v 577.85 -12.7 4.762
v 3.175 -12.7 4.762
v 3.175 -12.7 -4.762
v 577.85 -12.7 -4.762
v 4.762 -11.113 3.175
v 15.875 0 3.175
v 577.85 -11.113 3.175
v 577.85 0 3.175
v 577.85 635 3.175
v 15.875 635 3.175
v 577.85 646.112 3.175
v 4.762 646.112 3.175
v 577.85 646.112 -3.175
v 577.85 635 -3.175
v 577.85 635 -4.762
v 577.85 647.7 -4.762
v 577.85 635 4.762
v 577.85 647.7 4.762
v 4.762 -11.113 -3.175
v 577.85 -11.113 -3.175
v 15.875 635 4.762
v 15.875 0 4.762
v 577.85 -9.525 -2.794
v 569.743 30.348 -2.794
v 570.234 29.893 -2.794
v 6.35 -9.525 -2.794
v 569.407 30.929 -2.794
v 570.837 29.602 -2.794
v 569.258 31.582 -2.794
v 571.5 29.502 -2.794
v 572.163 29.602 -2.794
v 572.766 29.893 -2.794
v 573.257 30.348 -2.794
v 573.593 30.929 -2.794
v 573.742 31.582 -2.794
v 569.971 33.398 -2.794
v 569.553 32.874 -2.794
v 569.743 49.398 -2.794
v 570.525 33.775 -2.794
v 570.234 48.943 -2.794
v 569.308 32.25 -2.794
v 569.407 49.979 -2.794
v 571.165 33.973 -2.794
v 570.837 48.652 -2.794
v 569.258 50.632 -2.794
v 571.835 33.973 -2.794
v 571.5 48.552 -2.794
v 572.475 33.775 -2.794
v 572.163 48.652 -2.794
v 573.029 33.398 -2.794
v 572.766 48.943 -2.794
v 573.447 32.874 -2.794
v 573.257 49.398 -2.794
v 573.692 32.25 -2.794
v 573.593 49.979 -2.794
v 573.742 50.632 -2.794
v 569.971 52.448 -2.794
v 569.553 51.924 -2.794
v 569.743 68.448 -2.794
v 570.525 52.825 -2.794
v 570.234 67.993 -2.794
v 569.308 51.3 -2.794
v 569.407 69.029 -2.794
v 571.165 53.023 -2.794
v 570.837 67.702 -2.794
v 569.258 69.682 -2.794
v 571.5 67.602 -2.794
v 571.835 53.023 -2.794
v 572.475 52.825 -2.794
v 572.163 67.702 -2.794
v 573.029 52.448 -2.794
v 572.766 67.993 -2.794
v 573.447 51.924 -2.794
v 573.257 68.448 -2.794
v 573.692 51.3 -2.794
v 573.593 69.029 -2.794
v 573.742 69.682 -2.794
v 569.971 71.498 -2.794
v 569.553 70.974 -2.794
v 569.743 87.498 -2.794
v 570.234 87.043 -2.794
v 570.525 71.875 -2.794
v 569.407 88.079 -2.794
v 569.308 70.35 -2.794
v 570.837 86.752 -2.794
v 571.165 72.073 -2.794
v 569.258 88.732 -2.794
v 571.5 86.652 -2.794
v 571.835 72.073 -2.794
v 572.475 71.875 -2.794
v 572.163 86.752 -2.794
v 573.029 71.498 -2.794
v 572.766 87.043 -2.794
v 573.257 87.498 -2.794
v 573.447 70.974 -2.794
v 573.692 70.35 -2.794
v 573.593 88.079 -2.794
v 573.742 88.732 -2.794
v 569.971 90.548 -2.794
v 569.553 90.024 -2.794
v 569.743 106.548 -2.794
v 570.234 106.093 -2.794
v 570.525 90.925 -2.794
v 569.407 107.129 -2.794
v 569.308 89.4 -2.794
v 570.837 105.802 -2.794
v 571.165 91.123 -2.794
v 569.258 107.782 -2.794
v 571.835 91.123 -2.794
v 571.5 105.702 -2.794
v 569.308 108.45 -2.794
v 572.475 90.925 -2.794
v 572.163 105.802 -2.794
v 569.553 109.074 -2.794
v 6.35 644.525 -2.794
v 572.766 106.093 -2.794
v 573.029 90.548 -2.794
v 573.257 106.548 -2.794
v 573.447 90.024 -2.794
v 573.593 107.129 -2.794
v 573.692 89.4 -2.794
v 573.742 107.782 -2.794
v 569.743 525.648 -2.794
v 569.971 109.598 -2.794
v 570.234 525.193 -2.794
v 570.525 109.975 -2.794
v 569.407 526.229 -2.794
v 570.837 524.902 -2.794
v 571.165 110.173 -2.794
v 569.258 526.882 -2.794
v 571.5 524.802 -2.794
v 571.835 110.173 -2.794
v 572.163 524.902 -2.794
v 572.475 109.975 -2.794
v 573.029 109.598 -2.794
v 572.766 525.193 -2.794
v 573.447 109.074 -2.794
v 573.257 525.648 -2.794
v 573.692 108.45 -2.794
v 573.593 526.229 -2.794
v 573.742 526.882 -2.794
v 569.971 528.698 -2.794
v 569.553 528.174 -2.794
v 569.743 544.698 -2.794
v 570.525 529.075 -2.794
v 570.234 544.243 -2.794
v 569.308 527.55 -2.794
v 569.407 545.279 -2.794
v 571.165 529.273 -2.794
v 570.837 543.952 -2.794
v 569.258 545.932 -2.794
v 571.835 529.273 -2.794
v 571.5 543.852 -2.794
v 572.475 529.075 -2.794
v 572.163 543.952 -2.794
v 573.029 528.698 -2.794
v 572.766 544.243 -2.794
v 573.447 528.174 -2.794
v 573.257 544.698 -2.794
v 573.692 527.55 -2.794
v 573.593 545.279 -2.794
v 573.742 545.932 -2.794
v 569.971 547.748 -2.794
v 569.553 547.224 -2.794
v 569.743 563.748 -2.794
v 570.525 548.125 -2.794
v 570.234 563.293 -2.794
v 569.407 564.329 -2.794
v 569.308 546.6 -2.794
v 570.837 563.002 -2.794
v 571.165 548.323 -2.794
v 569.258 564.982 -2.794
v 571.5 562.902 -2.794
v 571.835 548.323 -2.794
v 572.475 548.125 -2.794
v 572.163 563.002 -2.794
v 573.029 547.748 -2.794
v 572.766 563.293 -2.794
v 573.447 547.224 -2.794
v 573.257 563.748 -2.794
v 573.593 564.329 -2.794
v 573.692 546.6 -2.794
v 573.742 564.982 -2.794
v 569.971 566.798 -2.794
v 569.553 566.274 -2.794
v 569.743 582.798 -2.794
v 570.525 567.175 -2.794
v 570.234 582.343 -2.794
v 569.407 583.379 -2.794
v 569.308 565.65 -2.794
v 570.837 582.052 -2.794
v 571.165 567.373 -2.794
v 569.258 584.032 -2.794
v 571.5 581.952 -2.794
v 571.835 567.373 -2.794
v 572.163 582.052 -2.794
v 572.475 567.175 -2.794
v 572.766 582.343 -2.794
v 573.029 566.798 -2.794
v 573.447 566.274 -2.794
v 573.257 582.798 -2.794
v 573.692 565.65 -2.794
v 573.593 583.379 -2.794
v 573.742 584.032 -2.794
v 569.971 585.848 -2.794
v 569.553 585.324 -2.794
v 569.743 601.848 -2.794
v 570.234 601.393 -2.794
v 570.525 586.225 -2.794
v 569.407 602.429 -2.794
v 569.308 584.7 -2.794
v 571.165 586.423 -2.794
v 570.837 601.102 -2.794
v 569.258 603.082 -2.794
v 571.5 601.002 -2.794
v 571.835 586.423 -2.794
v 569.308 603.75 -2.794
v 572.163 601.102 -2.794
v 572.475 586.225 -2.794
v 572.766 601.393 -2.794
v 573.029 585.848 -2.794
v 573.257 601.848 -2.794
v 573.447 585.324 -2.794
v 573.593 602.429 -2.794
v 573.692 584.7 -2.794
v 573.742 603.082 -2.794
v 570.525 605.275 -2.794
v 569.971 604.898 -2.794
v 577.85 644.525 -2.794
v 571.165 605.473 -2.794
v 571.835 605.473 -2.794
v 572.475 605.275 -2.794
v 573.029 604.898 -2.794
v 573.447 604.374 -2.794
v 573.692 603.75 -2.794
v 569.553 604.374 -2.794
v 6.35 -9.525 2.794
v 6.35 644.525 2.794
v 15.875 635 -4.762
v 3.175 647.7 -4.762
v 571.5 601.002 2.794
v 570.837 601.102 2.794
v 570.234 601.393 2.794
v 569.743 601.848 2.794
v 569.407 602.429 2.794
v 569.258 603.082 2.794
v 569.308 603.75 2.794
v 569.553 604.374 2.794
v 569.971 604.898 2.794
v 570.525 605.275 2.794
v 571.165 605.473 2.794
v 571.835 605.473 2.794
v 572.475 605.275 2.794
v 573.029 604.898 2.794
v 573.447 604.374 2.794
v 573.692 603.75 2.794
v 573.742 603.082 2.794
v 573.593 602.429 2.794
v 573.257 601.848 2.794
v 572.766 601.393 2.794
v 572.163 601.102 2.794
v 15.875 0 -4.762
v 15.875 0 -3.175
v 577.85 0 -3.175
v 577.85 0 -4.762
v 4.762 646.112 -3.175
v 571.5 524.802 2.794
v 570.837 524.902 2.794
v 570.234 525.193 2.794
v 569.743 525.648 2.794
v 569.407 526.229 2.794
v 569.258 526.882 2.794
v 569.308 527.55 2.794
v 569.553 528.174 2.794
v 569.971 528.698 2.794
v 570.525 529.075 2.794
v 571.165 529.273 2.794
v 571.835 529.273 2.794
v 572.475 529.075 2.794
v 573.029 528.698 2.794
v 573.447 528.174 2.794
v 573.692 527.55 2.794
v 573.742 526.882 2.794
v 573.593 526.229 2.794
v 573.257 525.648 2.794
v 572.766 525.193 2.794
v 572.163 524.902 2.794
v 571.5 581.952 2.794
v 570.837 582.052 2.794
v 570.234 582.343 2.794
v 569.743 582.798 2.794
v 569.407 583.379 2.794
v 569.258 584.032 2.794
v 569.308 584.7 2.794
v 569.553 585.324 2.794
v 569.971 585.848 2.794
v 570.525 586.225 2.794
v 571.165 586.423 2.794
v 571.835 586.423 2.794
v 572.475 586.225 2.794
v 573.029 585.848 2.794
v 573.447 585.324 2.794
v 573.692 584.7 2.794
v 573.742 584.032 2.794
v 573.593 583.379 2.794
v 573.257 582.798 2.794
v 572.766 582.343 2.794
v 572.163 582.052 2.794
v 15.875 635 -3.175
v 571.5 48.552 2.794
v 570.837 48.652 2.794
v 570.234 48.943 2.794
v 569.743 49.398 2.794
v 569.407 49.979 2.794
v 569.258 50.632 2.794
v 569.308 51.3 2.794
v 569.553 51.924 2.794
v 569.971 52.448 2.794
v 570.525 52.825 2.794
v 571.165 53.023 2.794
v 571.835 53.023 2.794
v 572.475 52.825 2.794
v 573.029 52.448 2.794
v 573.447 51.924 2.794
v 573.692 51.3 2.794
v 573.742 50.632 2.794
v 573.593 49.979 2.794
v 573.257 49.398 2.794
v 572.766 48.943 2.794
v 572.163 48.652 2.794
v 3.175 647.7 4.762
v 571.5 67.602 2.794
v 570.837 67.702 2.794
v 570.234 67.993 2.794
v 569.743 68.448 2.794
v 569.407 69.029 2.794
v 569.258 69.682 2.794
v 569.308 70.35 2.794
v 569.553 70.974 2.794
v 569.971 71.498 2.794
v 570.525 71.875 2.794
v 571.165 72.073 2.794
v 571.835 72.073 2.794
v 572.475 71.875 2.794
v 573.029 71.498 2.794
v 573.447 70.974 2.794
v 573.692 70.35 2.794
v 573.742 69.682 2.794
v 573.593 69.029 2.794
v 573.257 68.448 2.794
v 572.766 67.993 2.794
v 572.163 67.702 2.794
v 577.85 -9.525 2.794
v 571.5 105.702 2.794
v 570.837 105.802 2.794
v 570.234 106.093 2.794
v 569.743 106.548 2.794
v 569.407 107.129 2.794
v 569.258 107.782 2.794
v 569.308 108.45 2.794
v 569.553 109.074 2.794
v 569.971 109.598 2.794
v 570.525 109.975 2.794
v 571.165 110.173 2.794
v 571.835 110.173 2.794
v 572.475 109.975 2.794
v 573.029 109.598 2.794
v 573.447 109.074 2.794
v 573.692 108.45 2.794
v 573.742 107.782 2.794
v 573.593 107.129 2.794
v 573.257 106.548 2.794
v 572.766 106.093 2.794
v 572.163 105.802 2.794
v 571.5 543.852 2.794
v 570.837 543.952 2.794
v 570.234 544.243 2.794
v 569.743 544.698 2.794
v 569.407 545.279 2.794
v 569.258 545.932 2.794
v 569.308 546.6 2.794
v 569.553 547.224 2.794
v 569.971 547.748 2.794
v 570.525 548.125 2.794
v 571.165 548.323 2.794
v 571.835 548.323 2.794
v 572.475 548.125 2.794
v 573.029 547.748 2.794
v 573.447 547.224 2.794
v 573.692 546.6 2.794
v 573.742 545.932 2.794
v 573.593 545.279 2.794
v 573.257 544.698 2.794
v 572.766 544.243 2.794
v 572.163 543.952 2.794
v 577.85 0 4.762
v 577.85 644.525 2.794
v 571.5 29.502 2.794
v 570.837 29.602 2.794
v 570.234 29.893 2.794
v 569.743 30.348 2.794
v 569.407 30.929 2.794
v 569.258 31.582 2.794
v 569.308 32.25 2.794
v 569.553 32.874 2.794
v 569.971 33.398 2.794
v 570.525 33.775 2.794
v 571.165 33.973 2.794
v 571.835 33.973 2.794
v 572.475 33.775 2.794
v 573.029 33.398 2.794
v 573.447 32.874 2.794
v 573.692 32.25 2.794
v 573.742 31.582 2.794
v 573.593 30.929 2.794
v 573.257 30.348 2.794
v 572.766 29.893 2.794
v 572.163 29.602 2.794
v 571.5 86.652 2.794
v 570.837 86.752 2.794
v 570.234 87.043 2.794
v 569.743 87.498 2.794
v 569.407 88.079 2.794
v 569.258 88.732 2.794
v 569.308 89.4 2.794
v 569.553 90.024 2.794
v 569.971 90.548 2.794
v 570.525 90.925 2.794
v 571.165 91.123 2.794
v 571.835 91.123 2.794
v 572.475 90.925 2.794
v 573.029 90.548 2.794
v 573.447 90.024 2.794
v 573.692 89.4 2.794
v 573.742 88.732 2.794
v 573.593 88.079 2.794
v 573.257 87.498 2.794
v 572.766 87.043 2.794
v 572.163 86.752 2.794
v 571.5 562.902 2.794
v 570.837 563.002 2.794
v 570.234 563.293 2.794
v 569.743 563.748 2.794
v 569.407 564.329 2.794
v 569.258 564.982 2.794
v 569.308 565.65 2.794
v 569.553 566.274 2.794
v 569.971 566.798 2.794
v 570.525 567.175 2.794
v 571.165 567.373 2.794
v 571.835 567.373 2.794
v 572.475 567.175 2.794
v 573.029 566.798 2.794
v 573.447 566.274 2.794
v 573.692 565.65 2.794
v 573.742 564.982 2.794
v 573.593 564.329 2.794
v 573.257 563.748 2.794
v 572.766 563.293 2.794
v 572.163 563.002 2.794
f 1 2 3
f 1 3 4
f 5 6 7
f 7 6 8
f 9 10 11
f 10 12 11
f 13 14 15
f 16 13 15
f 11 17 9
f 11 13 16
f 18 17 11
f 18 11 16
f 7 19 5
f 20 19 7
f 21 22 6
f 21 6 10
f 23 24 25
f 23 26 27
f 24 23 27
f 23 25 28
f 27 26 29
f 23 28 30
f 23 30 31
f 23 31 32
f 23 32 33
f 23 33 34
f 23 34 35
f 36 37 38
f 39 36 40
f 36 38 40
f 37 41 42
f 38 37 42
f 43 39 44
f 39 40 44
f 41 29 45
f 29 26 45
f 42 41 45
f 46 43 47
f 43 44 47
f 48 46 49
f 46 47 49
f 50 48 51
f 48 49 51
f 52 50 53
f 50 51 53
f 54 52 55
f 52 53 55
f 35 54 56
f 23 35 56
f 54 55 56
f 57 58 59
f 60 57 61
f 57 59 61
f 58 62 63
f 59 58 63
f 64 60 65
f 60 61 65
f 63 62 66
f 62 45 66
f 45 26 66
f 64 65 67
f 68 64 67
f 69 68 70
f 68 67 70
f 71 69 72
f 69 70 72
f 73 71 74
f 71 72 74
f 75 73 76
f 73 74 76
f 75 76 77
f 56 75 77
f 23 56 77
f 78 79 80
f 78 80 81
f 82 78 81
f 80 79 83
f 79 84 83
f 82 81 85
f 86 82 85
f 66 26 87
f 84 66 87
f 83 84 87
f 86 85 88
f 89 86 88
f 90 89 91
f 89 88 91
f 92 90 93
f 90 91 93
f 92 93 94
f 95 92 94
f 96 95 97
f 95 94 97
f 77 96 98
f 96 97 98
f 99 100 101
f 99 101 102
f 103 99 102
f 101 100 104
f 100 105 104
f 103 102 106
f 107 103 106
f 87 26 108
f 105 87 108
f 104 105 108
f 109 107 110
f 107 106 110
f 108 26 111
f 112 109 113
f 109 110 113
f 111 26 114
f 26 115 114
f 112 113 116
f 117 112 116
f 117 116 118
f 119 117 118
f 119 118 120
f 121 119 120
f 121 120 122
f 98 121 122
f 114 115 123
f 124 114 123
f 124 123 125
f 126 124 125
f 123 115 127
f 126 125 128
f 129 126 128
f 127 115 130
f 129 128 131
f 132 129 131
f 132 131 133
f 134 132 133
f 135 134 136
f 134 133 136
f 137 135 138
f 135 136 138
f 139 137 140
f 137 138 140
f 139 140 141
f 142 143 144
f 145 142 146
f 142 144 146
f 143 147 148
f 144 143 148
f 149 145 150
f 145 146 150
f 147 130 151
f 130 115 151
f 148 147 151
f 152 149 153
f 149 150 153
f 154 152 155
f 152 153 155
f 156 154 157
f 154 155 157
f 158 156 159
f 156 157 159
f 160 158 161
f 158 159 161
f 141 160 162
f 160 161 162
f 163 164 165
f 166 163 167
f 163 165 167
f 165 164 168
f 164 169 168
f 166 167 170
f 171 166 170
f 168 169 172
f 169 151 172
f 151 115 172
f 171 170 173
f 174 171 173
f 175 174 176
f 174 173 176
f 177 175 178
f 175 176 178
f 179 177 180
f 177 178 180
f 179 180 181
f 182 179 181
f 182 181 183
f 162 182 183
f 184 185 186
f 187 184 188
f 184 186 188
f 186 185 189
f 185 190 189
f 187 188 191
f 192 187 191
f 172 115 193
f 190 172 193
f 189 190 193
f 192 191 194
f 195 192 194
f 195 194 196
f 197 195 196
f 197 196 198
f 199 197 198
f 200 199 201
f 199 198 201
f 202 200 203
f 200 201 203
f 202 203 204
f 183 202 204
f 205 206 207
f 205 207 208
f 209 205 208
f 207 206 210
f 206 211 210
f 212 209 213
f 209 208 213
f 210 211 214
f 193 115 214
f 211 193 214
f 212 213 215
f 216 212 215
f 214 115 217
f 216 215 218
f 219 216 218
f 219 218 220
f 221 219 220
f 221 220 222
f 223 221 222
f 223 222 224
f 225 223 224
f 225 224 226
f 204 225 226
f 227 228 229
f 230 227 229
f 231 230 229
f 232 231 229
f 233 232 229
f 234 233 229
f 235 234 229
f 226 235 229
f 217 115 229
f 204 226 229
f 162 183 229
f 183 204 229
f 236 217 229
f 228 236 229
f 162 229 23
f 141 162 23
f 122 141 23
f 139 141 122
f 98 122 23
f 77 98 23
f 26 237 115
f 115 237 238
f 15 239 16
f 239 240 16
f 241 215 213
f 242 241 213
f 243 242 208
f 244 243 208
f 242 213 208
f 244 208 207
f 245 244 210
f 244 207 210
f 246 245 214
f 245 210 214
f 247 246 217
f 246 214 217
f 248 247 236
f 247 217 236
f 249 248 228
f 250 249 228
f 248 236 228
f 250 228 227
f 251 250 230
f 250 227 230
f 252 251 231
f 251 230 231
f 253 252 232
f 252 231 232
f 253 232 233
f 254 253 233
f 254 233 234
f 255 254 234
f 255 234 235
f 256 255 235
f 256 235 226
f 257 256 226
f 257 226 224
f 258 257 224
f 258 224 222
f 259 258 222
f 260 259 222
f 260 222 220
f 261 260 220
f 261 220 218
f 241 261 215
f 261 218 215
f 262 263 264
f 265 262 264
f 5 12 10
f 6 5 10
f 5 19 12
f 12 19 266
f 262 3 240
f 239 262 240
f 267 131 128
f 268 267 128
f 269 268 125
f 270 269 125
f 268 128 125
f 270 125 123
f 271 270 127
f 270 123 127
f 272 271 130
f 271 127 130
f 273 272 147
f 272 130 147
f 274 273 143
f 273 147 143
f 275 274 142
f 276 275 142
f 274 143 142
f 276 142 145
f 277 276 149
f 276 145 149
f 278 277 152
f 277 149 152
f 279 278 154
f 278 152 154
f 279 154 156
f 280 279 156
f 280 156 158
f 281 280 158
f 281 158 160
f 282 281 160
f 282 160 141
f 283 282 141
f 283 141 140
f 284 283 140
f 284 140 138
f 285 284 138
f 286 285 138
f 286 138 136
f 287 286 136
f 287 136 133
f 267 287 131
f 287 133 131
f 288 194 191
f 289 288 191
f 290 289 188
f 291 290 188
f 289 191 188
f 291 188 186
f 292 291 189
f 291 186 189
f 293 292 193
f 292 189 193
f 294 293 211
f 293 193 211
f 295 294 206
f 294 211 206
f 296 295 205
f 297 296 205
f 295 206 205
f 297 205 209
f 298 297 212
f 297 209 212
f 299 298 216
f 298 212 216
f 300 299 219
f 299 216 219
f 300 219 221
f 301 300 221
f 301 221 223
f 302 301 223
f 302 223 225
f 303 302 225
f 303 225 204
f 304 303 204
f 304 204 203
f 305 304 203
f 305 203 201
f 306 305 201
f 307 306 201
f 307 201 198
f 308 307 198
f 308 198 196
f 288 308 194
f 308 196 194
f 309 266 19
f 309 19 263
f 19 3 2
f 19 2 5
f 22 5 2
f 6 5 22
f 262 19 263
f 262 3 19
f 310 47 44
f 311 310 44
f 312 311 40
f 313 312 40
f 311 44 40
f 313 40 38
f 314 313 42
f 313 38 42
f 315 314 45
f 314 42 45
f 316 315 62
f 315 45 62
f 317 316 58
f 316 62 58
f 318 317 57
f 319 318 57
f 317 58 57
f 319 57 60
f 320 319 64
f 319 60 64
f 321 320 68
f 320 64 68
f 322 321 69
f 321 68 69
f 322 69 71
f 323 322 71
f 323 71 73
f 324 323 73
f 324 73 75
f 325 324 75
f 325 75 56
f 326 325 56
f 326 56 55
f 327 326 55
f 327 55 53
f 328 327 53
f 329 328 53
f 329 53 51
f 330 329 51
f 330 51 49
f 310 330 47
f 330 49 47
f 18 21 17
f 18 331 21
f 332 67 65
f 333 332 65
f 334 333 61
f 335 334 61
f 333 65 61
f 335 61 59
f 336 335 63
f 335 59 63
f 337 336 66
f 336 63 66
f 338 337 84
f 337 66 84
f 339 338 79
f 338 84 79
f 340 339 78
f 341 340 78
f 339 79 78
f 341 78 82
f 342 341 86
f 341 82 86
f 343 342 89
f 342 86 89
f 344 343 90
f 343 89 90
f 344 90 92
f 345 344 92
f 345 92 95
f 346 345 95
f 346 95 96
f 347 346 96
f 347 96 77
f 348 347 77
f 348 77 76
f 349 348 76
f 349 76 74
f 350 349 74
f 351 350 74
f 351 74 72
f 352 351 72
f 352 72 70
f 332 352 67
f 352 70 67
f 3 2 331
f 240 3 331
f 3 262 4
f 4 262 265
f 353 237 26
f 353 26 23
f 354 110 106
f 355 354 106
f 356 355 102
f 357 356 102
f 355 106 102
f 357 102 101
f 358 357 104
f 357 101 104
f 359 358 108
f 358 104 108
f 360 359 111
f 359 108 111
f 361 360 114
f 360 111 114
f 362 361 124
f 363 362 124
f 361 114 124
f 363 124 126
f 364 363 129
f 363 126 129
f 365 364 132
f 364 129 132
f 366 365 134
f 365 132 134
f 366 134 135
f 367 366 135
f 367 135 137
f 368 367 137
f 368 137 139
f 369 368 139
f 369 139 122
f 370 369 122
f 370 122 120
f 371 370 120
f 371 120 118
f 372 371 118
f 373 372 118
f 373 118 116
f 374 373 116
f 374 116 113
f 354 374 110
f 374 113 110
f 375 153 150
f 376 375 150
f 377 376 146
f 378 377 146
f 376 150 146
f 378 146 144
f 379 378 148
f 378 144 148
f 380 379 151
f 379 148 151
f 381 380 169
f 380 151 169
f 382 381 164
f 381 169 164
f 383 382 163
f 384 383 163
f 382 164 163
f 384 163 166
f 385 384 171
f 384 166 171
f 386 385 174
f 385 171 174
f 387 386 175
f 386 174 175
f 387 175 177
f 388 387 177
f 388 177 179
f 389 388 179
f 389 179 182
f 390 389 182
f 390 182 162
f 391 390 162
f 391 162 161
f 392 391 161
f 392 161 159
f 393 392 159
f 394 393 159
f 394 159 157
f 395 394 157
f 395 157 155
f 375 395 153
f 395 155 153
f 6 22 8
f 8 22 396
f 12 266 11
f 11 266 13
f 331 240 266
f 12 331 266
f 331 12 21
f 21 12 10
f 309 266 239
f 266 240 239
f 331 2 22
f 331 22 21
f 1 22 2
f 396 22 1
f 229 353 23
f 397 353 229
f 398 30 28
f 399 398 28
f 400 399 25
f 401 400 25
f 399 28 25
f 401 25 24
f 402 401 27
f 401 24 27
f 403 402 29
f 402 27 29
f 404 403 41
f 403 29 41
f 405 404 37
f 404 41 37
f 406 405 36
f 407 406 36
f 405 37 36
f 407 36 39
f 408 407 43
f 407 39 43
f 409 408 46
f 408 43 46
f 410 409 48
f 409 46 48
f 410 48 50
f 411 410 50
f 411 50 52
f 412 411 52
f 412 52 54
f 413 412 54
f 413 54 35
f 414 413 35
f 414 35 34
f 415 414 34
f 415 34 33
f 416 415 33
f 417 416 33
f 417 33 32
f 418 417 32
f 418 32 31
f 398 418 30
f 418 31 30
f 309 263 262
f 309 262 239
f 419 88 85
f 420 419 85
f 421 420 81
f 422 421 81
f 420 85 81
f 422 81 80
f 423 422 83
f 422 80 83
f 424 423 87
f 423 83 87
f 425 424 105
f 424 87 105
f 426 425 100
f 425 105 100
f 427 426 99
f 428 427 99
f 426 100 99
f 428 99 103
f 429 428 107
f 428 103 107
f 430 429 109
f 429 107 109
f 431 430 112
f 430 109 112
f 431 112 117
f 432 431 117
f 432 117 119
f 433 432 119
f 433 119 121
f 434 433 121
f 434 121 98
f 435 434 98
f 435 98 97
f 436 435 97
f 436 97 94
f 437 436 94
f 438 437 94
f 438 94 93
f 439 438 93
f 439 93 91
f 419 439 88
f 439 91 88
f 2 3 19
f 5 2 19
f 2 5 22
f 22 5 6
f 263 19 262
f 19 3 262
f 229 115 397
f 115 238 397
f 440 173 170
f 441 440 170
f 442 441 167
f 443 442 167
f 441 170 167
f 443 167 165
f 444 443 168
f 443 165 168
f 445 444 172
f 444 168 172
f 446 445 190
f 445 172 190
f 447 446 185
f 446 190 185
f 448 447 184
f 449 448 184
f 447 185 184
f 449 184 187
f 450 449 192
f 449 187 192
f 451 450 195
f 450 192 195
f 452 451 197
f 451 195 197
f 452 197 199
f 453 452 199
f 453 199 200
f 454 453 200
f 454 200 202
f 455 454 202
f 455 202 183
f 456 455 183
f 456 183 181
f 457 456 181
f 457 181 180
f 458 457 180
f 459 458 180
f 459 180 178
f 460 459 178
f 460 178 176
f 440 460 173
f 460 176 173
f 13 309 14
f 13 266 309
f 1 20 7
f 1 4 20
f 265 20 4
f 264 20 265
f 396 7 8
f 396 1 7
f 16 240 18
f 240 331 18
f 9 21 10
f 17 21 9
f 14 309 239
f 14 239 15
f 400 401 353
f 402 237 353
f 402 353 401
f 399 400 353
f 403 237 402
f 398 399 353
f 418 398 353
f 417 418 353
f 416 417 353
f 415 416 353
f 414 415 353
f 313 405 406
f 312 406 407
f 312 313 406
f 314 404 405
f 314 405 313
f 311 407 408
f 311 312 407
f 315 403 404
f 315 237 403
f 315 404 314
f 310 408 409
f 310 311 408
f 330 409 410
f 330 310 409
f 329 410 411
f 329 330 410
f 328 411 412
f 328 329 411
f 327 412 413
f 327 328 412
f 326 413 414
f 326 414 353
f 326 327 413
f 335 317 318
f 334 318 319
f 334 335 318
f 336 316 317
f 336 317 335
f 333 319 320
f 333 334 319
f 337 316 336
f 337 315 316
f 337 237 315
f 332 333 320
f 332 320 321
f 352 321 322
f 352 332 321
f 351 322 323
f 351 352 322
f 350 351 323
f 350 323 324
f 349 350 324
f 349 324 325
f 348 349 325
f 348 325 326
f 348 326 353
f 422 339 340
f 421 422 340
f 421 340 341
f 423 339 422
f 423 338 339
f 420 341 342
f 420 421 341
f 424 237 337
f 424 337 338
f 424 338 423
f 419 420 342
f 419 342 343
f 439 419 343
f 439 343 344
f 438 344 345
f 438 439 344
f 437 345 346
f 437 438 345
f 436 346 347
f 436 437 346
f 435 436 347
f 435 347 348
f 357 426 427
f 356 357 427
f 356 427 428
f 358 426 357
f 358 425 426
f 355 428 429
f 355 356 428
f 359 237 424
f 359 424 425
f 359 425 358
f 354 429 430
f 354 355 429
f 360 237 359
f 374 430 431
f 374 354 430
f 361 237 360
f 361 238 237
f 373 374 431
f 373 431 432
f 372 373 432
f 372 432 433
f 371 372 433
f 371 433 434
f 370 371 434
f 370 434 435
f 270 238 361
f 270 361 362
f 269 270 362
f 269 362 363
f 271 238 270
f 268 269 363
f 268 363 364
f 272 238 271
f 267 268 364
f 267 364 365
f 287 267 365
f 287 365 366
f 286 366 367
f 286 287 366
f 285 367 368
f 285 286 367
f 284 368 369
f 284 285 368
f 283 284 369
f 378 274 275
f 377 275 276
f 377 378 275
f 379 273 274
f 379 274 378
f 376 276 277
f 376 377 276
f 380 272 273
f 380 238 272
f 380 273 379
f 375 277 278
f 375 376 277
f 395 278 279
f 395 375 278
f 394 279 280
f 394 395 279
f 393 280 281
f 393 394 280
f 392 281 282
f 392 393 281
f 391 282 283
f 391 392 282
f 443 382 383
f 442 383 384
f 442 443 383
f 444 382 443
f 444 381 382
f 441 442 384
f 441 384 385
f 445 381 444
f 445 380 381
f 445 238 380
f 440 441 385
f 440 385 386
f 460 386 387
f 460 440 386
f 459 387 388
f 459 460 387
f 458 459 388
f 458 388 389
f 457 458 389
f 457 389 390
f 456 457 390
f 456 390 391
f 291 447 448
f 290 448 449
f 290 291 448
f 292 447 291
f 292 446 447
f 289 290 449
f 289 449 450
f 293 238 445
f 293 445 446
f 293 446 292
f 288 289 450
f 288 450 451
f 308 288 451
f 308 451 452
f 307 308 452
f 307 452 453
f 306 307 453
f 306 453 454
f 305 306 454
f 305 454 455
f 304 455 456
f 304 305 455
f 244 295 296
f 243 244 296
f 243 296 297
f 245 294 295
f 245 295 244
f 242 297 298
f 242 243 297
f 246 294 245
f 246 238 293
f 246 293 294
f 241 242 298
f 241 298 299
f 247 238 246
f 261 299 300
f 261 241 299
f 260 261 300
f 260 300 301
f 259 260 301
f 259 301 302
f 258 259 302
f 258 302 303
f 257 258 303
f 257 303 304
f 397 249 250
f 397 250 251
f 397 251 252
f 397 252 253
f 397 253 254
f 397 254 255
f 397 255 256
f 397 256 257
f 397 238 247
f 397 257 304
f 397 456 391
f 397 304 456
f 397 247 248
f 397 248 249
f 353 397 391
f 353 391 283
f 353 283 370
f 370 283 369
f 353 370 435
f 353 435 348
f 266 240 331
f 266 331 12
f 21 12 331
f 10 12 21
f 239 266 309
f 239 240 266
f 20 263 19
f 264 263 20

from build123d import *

# Parameters (mm, degrees)
SKETCH2_W                             = 574.675
SKETCH2_H                             = 660.4
FRAME_OUTER_DIMENSIONS_DEPTH          = 4.7625
SKETCH3_W                             = 561.975
SKETCH3_H                             = 635
FRAME_INNER_DIMENSIONS_DEPTH          = 869.053361335
FRAME_PROFILE_DEPTH                   = 3.175
FRAME_PROFILE_DEPTH_BACK              = 3.175
SKETCH4_W                             = 573.0875
SKETCH4_H                             = 657.225
FRAME_SECTION_SPLIT_SURFACE_1_1_BACK  = 876.483
FRAME_SECTION_SPLIT_SURFACE_1_1_DEPTH = 1752.966
FRAME_SECTION_SPLIT_SURFACE_1_2_BACK  = 876.483
FRAME_SECTION_SPLIT_SURFACE_1_2_DEPTH = 1752.966
FRAME_SECTION_SPLIT_SURFACE_2_3_BACK  = 876.483
FRAME_SECTION_SPLIT_SURFACE_2_3_DEPTH = 1752.966
FRAME_SECTION_SPLIT_SURFACE_2_4_BACK  = 876.483
FRAME_SECTION_SPLIT_SURFACE_2_4_DEPTH = 1752.966
SKETCH5_W                             = 571.5
SKETCH5_H                             = 654.05
DOOR_PANEL_DEPTH                      = 2.794
SKETCH9_W                             = 2.2479
SKETCH9_H                             = 7.5565
F_8_CLEARANCE_HOLE1_AT_2_COUNT        = 2
F_8_CLEARANCE_HOLE1_AT_2_PITCH        = 19.05
F_8_CLEARANCE_HOLE1_AT_3_COUNT        = 2
F_8_CLEARANCE_HOLE1_AT_3_PITCH        = 38.1
F_8_CLEARANCE_HOLE1_AT_4_COUNT        = 2
F_8_CLEARANCE_HOLE1_AT_4_PITCH        = 57.15
F_8_CLEARANCE_HOLE1_AT_5_COUNT        = 2
F_8_CLEARANCE_HOLE1_AT_5_PITCH        = 76.2
F_8_CLEARANCE_HOLE1_AT_6_COUNT        = 2
F_8_CLEARANCE_HOLE1_AT_6_PITCH        = 514.35
F_8_CLEARANCE_HOLE1_AT_7_COUNT        = 2
F_8_CLEARANCE_HOLE1_AT_7_PITCH        = 533.4
F_8_CLEARANCE_HOLE1_AT_8_COUNT        = 2
F_8_CLEARANCE_HOLE1_AT_8_PITCH        = 552.45
F_8_CLEARANCE_HOLE1_AT_9_COUNT        = 2
F_8_CLEARANCE_HOLE1_AT_9_PITCH        = 571.5
F_8_CLEARANCE_HOLE1_AT_10_COUNT       = 2
F_8_CLEARANCE_HOLE1_AT_10_PITCH       = 495.3


with BuildPart() as part:
    # Sketch2 → Frame outer dimensions (new, symmetric)
    with BuildSketch(Plane.XY):
        with Locations((290.5125, 317.5)):
            Rectangle(SKETCH2_W, SKETCH2_H)
    extrude(amount=FRAME_OUTER_DIMENSIONS_DEPTH, both=True)

    # Sketch3 → Frame inner dimensions (cut, through all)
    with BuildSketch(Plane.XY.offset(4.7625)):
        with Locations((296.8625, 317.5)):
            Rectangle(SKETCH3_W, SKETCH3_H)
    extrude(amount=-FRAME_INNER_DIMENSIONS_DEPTH, mode=Mode.SUBTRACT)

    # Sketch4 → Frame profile (cut, two sides: drawn at the far end of the back side and taken through both)
    with BuildSketch(Plane.XY.offset(-FRAME_PROFILE_DEPTH_BACK)):
        with Locations((291.30625, 317.5)):
            Rectangle(SKETCH4_W, SKETCH4_H)
    extrude(amount=FRAME_PROFILE_DEPTH + FRAME_PROFILE_DEPTH_BACK, mode=Mode.SUBTRACT)


with BuildPart() as body_2:
    # Frame section split: the piece behind the surface
    add(part.part)
    # Frame section split surface 1: a surface, the sketch's curves swept straight by 1752.966 mm
    with BuildLine(Plane.XY.offset(4.7625).offset(-FRAME_SECTION_SPLIT_SURFACE_1_1_BACK), mode=Mode.PRIVATE) as frame_section_split_surface_1_1_path:
        Line((3.175, 647.7), (15.875, 635))
    frame_section_split_surface_1_1 = Shell.extrude(frame_section_split_surface_1_1_path.wire(), (0 * FRAME_SECTION_SPLIT_SURFACE_1_1_DEPTH, 0 * FRAME_SECTION_SPLIT_SURFACE_1_1_DEPTH, 1 * FRAME_SECTION_SPLIT_SURFACE_1_1_DEPTH))
    split(bisect_by=frame_section_split_surface_1_1, keep=Keep.BOTTOM)


with BuildPart() as part_1:
    add(part.part)

    # Frame section split: split by a surface, the side it looks to stays
    # Frame section split surface 1: a surface, the sketch's curves swept straight by 1752.966 mm
    with BuildLine(Plane.XY.offset(4.7625).offset(-FRAME_SECTION_SPLIT_SURFACE_1_2_BACK), mode=Mode.PRIVATE) as frame_section_split_surface_1_2_path:
        Line((3.175, 647.7), (15.875, 635))
    frame_section_split_surface_1_2 = Shell.extrude(frame_section_split_surface_1_2_path.wire(), (0 * FRAME_SECTION_SPLIT_SURFACE_1_2_DEPTH, 0 * FRAME_SECTION_SPLIT_SURFACE_1_2_DEPTH, 1 * FRAME_SECTION_SPLIT_SURFACE_1_2_DEPTH))
    split(bisect_by=frame_section_split_surface_1_2, keep=Keep.TOP)


with BuildPart() as body_3:
    # Frame section split 2 body 2: the piece behind the surface
    add(body_2.part)
    # Frame section split surface 2: a surface, the sketch's curves swept straight by 1752.966 mm
    with BuildLine(Plane.XY.offset(4.7625).offset(-FRAME_SECTION_SPLIT_SURFACE_2_3_BACK), mode=Mode.PRIVATE) as frame_section_split_surface_2_3_path:
        Line((3.175, -12.7), (15.875, 0))
    frame_section_split_surface_2_3 = Shell.extrude(frame_section_split_surface_2_3_path.wire(), (0 * FRAME_SECTION_SPLIT_SURFACE_2_3_DEPTH, 0 * FRAME_SECTION_SPLIT_SURFACE_2_3_DEPTH, 1 * FRAME_SECTION_SPLIT_SURFACE_2_3_DEPTH))
    split(bisect_by=frame_section_split_surface_2_3, keep=Keep.BOTTOM)


with BuildPart() as body_2_1:
    add(body_2.part)

    # Frame section split 2 body 2: split by a surface, the side it looks to stays
    # Frame section split surface 2: a surface, the sketch's curves swept straight by 1752.966 mm
    with BuildLine(Plane.XY.offset(4.7625).offset(-FRAME_SECTION_SPLIT_SURFACE_2_4_BACK), mode=Mode.PRIVATE) as frame_section_split_surface_2_4_path:
        Line((3.175, -12.7), (15.875, 0))
    frame_section_split_surface_2_4 = Shell.extrude(frame_section_split_surface_2_4_path.wire(), (0 * FRAME_SECTION_SPLIT_SURFACE_2_4_DEPTH, 0 * FRAME_SECTION_SPLIT_SURFACE_2_4_DEPTH, 1 * FRAME_SECTION_SPLIT_SURFACE_2_4_DEPTH))
    split(bisect_by=frame_section_split_surface_2_4, keep=Keep.TOP)


with BuildPart() as body_4:
    # Sketch5 → Door panel (new, symmetric)
    with BuildSketch(Plane.XY):
        with Locations((292.1, 317.5)):
            Rectangle(SKETCH5_W, SKETCH5_H)
    extrude(amount=DOOR_PANEL_DEPTH, both=True)

    # Sketch9 → #8 Clearance Hole1 (revolve, cut)
    with BuildSketch(Plane(origin=(571.5, 31.75, 2.794), x_dir=(0, -1, 0), z_dir=(1, 0, 0))):
        with Locations((1.12395, 3.77825)):
            Rectangle(SKETCH9_W, SKETCH9_H)
    f_8_clearance_hole1 = revolve(axis=Axis((571.5, 31.75, 9.144), (0, 0, -1)), mode=Mode.SUBTRACT)

    # #8 Clearance Hole1 at 2: #8 Clearance Hole1 ×2
    with Locations(*[(0, i * F_8_CLEARANCE_HOLE1_AT_2_PITCH, 0) for i in range(1, F_8_CLEARANCE_HOLE1_AT_2_COUNT)]):
        add(f_8_clearance_hole1, mode=Mode.SUBTRACT)

    # #8 Clearance Hole1 at 3: #8 Clearance Hole1 ×2
    with Locations(*[(0, i * F_8_CLEARANCE_HOLE1_AT_3_PITCH, 0) for i in range(1, F_8_CLEARANCE_HOLE1_AT_3_COUNT)]):
        add(f_8_clearance_hole1, mode=Mode.SUBTRACT)

    # #8 Clearance Hole1 at 4: #8 Clearance Hole1 ×2
    with Locations(*[(0, i * F_8_CLEARANCE_HOLE1_AT_4_PITCH, 0) for i in range(1, F_8_CLEARANCE_HOLE1_AT_4_COUNT)]):
        add(f_8_clearance_hole1, mode=Mode.SUBTRACT)

    # #8 Clearance Hole1 at 5: #8 Clearance Hole1 ×2
    with Locations(*[(0, i * F_8_CLEARANCE_HOLE1_AT_5_PITCH, 0) for i in range(1, F_8_CLEARANCE_HOLE1_AT_5_COUNT)]):
        add(f_8_clearance_hole1, mode=Mode.SUBTRACT)

    # #8 Clearance Hole1 at 6: #8 Clearance Hole1 ×2
    with Locations(*[(0, i * F_8_CLEARANCE_HOLE1_AT_6_PITCH, 0) for i in range(1, F_8_CLEARANCE_HOLE1_AT_6_COUNT)]):
        add(f_8_clearance_hole1, mode=Mode.SUBTRACT)

    # #8 Clearance Hole1 at 7: #8 Clearance Hole1 ×2
    with Locations(*[(0, i * F_8_CLEARANCE_HOLE1_AT_7_PITCH, 0) for i in range(1, F_8_CLEARANCE_HOLE1_AT_7_COUNT)]):
        add(f_8_clearance_hole1, mode=Mode.SUBTRACT)

    # #8 Clearance Hole1 at 8: #8 Clearance Hole1 ×2
    with Locations(*[(0, i * F_8_CLEARANCE_HOLE1_AT_8_PITCH, 0) for i in range(1, F_8_CLEARANCE_HOLE1_AT_8_COUNT)]):
        add(f_8_clearance_hole1, mode=Mode.SUBTRACT)

    # #8 Clearance Hole1 at 9: #8 Clearance Hole1 ×2
    with Locations(*[(0, i * F_8_CLEARANCE_HOLE1_AT_9_PITCH, 0) for i in range(1, F_8_CLEARANCE_HOLE1_AT_9_COUNT)]):
        add(f_8_clearance_hole1, mode=Mode.SUBTRACT)

    # #8 Clearance Hole1 at 10: #8 Clearance Hole1 ×2
    with Locations(*[(0, i * F_8_CLEARANCE_HOLE1_AT_10_PITCH, 0) for i in range(1, F_8_CLEARANCE_HOLE1_AT_10_COUNT)]):
        add(f_8_clearance_hole1, mode=Mode.SUBTRACT)


with BuildPart() as body_5:
    # Mirror1: mirrored copy
    add(body_3.part.mirror(Plane(origin=(0, 0, 0), x_dir=(0, 0, 1), z_dir=(1, 0, 0))))


with BuildPart() as body_6:
    # Mirror1 2: mirrored copy
    add(body_2_1.part.mirror(Plane(origin=(0, 0, 0), x_dir=(0, 0, 1), z_dir=(1, 0, 0))))


with BuildPart() as body_7:
    # Mirror1 3: mirrored copy
    add(part_1.part.mirror(Plane(origin=(0, 0, 0), x_dir=(0, 0, 1), z_dir=(1, 0, 0))))


with BuildPart() as body_8:
    # Mirror1 4: mirrored copy
    add(body_4.part.mirror(Plane(origin=(0, 0, 0), x_dir=(0, 0, 1), z_dir=(1, 0, 0))))


solid = Compound([part_1.part, body_3.part, body_2_1.part, body_4.part])
